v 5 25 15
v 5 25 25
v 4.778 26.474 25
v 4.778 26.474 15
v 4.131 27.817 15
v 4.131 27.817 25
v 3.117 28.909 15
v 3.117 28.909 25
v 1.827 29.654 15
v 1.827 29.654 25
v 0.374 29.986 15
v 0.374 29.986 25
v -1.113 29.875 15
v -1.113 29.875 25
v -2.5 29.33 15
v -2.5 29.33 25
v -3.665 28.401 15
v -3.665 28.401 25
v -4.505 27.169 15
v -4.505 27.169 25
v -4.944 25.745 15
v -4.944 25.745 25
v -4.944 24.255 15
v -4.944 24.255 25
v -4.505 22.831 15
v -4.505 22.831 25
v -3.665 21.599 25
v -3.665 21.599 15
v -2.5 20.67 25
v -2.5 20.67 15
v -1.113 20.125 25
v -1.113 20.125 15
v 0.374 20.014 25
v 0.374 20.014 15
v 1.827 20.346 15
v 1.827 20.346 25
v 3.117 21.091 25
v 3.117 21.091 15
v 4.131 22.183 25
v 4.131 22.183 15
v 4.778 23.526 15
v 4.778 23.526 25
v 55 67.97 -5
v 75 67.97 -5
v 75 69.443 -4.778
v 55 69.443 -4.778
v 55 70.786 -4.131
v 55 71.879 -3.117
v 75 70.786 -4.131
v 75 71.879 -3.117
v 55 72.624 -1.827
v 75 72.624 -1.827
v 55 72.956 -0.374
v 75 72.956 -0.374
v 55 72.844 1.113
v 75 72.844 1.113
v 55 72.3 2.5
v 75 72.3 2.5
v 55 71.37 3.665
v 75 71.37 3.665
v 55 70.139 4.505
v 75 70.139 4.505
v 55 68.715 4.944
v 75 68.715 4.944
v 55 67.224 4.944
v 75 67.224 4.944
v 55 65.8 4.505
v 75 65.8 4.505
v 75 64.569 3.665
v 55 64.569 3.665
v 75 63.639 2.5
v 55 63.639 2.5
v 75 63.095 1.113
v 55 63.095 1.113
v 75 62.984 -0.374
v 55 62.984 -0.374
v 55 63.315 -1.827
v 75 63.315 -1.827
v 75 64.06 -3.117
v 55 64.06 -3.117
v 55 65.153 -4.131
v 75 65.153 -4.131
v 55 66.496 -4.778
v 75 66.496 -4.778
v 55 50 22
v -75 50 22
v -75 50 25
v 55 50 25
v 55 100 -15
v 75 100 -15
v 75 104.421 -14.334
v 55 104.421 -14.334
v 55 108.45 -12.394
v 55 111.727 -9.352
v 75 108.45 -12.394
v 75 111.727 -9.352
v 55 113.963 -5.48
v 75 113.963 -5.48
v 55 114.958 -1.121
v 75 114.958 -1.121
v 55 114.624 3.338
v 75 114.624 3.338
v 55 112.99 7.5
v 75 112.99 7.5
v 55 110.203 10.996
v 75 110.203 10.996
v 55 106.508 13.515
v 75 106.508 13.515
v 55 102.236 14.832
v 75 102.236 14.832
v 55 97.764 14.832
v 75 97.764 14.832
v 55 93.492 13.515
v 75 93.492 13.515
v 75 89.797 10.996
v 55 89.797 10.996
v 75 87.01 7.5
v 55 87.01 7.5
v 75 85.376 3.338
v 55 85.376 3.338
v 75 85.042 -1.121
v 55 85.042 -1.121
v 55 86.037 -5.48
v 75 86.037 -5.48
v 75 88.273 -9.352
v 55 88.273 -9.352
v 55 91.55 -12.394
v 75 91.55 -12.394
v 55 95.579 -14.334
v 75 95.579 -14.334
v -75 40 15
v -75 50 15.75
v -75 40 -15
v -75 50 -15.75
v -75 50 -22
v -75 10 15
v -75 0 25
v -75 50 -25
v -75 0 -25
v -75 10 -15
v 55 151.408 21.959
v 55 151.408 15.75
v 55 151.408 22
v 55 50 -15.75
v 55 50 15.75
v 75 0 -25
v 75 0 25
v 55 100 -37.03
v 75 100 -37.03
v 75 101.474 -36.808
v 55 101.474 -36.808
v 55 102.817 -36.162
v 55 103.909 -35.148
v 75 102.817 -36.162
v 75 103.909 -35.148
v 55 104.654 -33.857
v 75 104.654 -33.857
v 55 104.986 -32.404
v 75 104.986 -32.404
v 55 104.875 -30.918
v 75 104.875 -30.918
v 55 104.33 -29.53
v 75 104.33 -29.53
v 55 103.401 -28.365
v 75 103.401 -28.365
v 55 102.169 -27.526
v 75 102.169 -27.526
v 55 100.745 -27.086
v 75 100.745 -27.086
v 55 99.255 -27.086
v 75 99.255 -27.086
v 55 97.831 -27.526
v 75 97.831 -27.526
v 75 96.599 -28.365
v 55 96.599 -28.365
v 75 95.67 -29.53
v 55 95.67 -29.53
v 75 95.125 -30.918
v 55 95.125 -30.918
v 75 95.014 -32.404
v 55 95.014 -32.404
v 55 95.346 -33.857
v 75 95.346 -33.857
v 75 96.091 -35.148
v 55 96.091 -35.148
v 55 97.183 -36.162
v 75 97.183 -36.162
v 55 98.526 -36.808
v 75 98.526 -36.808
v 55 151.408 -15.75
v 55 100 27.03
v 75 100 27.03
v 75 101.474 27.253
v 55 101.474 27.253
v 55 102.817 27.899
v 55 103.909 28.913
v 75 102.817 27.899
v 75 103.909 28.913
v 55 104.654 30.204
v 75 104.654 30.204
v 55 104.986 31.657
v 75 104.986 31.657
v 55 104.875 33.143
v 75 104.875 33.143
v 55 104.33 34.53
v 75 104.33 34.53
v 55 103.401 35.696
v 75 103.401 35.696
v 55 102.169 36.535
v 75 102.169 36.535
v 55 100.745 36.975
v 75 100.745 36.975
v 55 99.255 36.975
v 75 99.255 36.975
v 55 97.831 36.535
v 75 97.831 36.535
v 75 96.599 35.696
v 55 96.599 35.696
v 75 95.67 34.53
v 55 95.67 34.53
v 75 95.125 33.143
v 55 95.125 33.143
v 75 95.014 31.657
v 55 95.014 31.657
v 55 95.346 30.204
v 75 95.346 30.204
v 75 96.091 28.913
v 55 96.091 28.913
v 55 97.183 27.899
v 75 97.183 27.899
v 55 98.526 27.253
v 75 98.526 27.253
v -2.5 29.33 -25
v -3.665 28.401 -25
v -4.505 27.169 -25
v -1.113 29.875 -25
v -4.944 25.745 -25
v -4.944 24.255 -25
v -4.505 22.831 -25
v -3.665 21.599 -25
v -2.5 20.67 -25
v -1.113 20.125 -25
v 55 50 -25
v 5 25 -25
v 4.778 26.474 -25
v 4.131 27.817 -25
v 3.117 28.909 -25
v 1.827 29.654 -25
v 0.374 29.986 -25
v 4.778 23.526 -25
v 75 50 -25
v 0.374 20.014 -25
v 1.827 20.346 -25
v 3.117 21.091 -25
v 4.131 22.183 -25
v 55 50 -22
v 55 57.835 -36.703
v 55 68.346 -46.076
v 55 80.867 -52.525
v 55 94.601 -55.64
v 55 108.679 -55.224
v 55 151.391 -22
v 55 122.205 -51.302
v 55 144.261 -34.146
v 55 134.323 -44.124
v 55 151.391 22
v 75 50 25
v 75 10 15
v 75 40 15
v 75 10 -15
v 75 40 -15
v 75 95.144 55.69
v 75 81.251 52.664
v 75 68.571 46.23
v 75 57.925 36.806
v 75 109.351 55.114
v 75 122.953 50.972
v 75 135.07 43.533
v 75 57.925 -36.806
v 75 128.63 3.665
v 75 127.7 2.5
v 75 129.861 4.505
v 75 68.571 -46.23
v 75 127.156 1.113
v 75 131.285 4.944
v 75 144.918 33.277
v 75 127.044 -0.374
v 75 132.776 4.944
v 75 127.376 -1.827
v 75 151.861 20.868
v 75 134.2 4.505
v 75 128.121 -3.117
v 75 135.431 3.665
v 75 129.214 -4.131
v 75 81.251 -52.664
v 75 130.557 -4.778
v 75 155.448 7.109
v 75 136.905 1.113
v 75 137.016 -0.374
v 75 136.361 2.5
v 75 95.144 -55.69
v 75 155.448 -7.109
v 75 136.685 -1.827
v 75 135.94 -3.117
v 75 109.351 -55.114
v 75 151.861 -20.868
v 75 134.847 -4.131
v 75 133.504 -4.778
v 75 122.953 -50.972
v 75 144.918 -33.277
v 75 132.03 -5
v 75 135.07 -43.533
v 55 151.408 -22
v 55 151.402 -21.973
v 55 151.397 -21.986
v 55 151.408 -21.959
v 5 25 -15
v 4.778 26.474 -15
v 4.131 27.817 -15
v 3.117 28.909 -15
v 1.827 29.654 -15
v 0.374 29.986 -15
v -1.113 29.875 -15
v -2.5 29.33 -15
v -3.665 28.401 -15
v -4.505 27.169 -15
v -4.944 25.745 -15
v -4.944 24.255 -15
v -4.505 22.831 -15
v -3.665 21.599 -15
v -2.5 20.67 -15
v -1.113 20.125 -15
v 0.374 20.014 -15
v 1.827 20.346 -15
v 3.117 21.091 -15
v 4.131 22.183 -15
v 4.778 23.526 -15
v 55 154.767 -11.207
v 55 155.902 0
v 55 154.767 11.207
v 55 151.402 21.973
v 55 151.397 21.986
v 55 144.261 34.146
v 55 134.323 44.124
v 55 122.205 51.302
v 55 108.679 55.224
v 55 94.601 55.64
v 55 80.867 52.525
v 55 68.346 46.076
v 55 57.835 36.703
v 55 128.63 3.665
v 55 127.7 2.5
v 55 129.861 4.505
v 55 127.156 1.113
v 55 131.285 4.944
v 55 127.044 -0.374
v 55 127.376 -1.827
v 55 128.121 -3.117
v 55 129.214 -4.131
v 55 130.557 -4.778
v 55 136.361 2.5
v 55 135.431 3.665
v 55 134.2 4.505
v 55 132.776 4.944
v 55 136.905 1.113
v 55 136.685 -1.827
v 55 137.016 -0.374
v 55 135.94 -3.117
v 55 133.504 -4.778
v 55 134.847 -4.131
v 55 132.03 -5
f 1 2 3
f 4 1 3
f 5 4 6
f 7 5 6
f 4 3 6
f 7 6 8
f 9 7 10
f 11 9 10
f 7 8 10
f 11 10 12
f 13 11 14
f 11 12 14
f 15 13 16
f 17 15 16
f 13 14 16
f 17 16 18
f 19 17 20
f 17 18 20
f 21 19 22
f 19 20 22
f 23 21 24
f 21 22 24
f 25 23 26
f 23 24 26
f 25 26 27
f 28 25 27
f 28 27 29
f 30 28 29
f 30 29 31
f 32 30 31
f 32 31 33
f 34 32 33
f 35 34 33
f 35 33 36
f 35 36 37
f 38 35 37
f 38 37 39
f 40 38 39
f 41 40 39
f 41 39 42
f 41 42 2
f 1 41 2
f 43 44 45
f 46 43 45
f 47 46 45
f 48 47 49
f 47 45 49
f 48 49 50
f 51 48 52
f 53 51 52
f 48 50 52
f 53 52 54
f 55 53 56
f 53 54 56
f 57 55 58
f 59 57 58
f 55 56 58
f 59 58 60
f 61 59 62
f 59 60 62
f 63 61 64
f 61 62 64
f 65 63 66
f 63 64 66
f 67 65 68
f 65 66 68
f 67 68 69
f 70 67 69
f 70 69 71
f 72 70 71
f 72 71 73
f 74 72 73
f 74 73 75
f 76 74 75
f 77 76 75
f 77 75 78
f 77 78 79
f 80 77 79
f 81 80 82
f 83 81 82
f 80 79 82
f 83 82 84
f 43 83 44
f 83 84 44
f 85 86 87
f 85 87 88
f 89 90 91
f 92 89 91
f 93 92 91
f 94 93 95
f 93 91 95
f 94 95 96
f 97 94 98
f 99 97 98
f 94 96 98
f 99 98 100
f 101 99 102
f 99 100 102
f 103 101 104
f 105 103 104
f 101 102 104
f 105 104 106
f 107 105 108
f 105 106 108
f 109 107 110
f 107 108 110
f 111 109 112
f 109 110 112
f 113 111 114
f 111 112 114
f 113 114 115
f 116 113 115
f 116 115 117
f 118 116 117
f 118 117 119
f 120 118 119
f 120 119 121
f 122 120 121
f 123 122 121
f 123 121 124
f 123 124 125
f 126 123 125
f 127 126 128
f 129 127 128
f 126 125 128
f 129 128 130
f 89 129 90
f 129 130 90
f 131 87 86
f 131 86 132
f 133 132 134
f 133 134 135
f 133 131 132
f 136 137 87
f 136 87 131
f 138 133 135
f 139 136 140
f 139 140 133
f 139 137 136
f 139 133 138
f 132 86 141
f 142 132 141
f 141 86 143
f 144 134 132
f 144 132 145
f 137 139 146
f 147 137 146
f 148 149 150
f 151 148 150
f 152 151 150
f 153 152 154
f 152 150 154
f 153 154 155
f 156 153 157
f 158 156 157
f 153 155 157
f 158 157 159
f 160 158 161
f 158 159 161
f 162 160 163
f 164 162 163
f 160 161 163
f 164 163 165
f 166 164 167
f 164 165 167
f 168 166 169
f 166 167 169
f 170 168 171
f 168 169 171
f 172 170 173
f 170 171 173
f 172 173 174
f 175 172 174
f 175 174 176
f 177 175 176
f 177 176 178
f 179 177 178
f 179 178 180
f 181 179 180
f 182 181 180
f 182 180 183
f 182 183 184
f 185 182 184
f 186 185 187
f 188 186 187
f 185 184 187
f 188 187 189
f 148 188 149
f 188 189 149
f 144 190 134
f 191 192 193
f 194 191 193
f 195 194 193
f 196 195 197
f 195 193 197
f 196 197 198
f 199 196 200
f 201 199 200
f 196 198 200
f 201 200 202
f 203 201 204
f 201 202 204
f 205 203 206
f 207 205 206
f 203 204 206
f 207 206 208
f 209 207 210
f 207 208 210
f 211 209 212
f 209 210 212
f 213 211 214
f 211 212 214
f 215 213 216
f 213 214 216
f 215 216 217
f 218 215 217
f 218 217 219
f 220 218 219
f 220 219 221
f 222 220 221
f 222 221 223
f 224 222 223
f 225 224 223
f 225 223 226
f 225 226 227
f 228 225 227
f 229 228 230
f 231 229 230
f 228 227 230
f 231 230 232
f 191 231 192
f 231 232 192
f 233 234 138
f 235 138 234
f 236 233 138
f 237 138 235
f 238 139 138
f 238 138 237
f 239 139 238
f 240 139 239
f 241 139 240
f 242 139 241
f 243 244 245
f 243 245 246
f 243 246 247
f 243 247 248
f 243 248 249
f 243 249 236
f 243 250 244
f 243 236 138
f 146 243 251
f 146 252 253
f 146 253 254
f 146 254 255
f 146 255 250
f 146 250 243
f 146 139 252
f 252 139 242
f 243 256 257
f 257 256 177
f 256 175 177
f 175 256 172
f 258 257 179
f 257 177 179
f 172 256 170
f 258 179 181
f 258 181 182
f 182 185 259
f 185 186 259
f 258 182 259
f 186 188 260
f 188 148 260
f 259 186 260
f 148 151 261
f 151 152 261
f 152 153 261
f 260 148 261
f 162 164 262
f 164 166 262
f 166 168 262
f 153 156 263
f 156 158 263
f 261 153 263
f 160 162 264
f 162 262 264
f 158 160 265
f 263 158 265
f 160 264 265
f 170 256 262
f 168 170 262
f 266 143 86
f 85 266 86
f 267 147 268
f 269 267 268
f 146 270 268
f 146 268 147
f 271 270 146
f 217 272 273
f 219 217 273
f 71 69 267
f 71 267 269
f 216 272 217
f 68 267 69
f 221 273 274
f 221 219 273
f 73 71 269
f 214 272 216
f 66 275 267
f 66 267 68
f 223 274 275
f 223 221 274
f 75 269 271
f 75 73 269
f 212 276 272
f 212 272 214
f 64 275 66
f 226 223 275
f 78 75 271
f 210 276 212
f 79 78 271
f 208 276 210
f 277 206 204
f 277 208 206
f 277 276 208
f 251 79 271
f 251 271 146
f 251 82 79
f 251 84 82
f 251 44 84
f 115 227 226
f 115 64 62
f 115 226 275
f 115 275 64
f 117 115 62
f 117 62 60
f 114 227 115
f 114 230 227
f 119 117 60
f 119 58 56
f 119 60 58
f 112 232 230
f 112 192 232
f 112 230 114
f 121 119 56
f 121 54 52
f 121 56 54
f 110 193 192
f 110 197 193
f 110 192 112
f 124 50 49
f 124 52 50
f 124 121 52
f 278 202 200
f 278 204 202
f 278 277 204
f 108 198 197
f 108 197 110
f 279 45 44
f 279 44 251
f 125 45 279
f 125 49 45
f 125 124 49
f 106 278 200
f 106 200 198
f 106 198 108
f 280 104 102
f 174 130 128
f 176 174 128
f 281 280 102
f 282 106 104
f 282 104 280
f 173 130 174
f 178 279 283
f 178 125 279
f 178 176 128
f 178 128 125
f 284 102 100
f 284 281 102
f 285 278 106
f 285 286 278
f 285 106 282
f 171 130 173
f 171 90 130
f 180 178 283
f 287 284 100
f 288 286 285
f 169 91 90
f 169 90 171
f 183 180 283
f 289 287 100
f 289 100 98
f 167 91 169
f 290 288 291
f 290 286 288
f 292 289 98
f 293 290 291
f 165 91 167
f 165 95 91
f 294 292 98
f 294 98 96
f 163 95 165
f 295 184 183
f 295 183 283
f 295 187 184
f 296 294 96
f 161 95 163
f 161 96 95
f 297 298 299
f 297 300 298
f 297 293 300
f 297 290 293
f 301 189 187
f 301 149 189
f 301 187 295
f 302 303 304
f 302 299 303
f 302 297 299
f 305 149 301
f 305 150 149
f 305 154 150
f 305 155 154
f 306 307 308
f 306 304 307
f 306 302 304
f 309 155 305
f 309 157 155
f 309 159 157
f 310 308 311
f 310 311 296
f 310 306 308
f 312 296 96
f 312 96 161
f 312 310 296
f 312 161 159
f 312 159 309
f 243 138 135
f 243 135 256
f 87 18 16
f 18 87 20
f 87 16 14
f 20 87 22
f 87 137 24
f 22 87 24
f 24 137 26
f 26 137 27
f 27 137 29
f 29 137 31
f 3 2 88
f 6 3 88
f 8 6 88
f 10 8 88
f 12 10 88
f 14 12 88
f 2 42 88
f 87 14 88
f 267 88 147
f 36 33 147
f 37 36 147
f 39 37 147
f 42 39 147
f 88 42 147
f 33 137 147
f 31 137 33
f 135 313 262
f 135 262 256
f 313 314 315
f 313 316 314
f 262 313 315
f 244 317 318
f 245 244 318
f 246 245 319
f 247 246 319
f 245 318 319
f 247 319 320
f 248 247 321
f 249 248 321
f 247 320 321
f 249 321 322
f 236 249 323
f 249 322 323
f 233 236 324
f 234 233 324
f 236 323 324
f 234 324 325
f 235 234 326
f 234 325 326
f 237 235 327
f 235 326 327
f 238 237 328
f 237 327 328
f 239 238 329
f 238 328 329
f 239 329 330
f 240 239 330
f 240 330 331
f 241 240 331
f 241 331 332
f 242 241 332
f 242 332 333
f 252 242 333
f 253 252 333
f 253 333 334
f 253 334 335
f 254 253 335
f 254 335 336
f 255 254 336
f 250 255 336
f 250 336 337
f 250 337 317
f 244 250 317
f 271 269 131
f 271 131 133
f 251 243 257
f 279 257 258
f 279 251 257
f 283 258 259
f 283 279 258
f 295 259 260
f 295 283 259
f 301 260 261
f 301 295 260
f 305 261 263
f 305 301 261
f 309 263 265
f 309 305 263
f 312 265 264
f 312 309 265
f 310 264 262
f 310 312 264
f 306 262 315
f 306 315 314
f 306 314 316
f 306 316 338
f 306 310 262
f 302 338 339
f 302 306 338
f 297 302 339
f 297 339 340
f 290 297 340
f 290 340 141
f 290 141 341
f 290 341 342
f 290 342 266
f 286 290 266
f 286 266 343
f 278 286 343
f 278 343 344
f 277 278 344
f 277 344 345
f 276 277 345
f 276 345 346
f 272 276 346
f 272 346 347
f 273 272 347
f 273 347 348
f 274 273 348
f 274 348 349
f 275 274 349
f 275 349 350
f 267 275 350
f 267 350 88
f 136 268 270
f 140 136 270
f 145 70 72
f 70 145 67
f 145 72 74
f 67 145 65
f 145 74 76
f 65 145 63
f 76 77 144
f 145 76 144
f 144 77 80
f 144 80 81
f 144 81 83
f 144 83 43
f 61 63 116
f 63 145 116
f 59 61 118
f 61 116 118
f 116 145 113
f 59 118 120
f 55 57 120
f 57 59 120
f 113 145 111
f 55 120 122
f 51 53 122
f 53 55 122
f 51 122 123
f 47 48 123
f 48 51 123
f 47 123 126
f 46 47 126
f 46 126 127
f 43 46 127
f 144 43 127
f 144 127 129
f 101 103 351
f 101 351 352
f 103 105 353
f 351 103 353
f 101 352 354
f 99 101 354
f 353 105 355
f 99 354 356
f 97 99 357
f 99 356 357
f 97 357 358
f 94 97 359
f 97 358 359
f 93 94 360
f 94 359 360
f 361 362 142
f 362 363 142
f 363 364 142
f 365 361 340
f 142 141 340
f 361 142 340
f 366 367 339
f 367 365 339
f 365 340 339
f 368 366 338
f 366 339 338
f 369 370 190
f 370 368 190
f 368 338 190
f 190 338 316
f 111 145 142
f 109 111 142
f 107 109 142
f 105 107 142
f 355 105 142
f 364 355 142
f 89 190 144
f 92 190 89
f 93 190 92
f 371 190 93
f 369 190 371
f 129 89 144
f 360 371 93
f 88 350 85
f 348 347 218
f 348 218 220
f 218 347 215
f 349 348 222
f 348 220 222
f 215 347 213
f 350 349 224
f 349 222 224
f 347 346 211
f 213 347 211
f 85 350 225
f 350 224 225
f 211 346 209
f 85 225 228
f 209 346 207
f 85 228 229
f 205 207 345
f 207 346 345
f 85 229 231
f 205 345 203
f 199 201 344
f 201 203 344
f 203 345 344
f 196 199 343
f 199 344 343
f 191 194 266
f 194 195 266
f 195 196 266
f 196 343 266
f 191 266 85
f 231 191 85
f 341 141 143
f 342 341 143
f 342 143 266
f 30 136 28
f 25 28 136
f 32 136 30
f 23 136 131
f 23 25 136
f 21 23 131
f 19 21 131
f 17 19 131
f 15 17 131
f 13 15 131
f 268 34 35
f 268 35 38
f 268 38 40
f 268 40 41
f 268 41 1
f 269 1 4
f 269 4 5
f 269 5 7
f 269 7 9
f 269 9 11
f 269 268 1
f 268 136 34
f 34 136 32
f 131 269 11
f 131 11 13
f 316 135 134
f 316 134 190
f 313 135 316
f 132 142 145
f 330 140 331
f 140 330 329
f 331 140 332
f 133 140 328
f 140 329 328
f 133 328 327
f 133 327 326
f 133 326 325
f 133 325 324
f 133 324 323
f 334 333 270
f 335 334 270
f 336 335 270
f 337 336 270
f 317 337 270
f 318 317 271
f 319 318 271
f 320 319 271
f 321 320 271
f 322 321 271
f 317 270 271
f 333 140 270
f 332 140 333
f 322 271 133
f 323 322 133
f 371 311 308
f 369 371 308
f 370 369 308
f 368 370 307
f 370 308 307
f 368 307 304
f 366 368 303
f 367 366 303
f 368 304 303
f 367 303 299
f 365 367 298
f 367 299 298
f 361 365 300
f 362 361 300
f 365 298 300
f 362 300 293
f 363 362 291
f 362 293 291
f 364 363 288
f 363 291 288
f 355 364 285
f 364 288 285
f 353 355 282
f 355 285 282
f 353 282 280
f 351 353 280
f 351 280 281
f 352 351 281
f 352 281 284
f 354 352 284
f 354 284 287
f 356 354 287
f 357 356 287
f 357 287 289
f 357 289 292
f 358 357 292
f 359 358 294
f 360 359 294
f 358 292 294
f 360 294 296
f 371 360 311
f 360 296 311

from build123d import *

# Parameters (mm, degrees)
SKETCH2_W               = 150
SKETCH2_H               = 50
BOSS_EXTRUDE1_DEPTH     = 50
SKETCH5_W               = 30
SKETCH5_H               = 30
CUT_EXTRUDE1_DEPTH      = 1
CUT_EXTRUDE1_DEPTH_BACK = 151
SKETCH7_R               = 55.901699437
SKETCH7_R_2             = 15
SKETCH7_R_3             = 5
BOSS_EXTRUDE2_DEPTH     = 20
BOSS_EXTRUDE3_START     = -3
BOSS_EXTRUDE3_DEPTH     = 6.25
SKETCH11_R              = 5
CUT_EXTRUDE2_DEPTH      = 31.901699437
CUT_EXTRUDE2_DEPTH_BACK = 81.901699437


with BuildPart() as part:
    # Sketch2 → Boss-Extrude1 (new body)
    with BuildSketch(Plane(origin=(0, 0, 0), x_dir=(1, 0, 0), z_dir=(0, 1, 0))):
        Rectangle(SKETCH2_W, SKETCH2_H)
    extrude(amount=BOSS_EXTRUDE1_DEPTH)

    # Sketch5 → Cut-Extrude1 (cut, two sides)
    with BuildSketch(Plane(origin=(75, 0, 0), x_dir=(0, 0, -1), z_dir=(1, 0, 0))) as cut_extrude1_sk:
        with Locations((0, 25)):
            Rectangle(SKETCH5_W, SKETCH5_H)
    extrude(amount=CUT_EXTRUDE1_DEPTH, mode=Mode.SUBTRACT)
    extrude(cut_extrude1_sk.sketch, amount=-CUT_EXTRUDE1_DEPTH_BACK, mode=Mode.SUBTRACT)

    # Sketch7 → Boss-Extrude2 (add)
    with BuildSketch(Plane(origin=(75, 0, 0), x_dir=(0, 0, -1), z_dir=(1, 0, 0))):
        with Locations((0, 100)):
            Circle(SKETCH7_R)
        with Locations((0, 100)):
            Circle(SKETCH7_R_2, mode=Mode.SUBTRACT)
        with Locations((0, 132.030384042)):
            Circle(SKETCH7_R_3, mode=Mode.SUBTRACT)
        with Locations((32.030384042, 100)):
            Circle(SKETCH7_R_3, mode=Mode.SUBTRACT)
        with Locations((0, 67.969615958)):
            Circle(SKETCH7_R_3, mode=Mode.SUBTRACT)
        with Locations((-32.030384042, 100)):
            Circle(SKETCH7_R_3, mode=Mode.SUBTRACT)
    extrude(amount=-BOSS_EXTRUDE2_DEPTH)

    # Sketch8 → Boss-Extrude3 (add)
    with BuildSketch(Plane(origin=(0, 0, -25), x_dir=(-1, 0, 0), z_dir=(0, 0, -1)).offset(BOSS_EXTRUDE3_START)):
        Polygon((75, 50), (-55, 151.408233922), (-55, 50), align=None)
    boss_extrude3 = extrude(amount=-BOSS_EXTRUDE3_DEPTH)

    # Sketch11 → Cut-Extrude2 (cut, two sides)
    with BuildSketch(Plane.XY.offset(25)) as cut_extrude2_sk:
        with Locations((0, 25)):
            Circle(SKETCH11_R)
    extrude(amount=CUT_EXTRUDE2_DEPTH, mode=Mode.SUBTRACT)
    extrude(cut_extrude2_sk.sketch, amount=-CUT_EXTRUDE2_DEPTH_BACK, mode=Mode.SUBTRACT)

    # Mirror1: Boss-Extrude3 across plane
    add(boss_extrude3.mirror(Plane.XY))


solid = part.part
